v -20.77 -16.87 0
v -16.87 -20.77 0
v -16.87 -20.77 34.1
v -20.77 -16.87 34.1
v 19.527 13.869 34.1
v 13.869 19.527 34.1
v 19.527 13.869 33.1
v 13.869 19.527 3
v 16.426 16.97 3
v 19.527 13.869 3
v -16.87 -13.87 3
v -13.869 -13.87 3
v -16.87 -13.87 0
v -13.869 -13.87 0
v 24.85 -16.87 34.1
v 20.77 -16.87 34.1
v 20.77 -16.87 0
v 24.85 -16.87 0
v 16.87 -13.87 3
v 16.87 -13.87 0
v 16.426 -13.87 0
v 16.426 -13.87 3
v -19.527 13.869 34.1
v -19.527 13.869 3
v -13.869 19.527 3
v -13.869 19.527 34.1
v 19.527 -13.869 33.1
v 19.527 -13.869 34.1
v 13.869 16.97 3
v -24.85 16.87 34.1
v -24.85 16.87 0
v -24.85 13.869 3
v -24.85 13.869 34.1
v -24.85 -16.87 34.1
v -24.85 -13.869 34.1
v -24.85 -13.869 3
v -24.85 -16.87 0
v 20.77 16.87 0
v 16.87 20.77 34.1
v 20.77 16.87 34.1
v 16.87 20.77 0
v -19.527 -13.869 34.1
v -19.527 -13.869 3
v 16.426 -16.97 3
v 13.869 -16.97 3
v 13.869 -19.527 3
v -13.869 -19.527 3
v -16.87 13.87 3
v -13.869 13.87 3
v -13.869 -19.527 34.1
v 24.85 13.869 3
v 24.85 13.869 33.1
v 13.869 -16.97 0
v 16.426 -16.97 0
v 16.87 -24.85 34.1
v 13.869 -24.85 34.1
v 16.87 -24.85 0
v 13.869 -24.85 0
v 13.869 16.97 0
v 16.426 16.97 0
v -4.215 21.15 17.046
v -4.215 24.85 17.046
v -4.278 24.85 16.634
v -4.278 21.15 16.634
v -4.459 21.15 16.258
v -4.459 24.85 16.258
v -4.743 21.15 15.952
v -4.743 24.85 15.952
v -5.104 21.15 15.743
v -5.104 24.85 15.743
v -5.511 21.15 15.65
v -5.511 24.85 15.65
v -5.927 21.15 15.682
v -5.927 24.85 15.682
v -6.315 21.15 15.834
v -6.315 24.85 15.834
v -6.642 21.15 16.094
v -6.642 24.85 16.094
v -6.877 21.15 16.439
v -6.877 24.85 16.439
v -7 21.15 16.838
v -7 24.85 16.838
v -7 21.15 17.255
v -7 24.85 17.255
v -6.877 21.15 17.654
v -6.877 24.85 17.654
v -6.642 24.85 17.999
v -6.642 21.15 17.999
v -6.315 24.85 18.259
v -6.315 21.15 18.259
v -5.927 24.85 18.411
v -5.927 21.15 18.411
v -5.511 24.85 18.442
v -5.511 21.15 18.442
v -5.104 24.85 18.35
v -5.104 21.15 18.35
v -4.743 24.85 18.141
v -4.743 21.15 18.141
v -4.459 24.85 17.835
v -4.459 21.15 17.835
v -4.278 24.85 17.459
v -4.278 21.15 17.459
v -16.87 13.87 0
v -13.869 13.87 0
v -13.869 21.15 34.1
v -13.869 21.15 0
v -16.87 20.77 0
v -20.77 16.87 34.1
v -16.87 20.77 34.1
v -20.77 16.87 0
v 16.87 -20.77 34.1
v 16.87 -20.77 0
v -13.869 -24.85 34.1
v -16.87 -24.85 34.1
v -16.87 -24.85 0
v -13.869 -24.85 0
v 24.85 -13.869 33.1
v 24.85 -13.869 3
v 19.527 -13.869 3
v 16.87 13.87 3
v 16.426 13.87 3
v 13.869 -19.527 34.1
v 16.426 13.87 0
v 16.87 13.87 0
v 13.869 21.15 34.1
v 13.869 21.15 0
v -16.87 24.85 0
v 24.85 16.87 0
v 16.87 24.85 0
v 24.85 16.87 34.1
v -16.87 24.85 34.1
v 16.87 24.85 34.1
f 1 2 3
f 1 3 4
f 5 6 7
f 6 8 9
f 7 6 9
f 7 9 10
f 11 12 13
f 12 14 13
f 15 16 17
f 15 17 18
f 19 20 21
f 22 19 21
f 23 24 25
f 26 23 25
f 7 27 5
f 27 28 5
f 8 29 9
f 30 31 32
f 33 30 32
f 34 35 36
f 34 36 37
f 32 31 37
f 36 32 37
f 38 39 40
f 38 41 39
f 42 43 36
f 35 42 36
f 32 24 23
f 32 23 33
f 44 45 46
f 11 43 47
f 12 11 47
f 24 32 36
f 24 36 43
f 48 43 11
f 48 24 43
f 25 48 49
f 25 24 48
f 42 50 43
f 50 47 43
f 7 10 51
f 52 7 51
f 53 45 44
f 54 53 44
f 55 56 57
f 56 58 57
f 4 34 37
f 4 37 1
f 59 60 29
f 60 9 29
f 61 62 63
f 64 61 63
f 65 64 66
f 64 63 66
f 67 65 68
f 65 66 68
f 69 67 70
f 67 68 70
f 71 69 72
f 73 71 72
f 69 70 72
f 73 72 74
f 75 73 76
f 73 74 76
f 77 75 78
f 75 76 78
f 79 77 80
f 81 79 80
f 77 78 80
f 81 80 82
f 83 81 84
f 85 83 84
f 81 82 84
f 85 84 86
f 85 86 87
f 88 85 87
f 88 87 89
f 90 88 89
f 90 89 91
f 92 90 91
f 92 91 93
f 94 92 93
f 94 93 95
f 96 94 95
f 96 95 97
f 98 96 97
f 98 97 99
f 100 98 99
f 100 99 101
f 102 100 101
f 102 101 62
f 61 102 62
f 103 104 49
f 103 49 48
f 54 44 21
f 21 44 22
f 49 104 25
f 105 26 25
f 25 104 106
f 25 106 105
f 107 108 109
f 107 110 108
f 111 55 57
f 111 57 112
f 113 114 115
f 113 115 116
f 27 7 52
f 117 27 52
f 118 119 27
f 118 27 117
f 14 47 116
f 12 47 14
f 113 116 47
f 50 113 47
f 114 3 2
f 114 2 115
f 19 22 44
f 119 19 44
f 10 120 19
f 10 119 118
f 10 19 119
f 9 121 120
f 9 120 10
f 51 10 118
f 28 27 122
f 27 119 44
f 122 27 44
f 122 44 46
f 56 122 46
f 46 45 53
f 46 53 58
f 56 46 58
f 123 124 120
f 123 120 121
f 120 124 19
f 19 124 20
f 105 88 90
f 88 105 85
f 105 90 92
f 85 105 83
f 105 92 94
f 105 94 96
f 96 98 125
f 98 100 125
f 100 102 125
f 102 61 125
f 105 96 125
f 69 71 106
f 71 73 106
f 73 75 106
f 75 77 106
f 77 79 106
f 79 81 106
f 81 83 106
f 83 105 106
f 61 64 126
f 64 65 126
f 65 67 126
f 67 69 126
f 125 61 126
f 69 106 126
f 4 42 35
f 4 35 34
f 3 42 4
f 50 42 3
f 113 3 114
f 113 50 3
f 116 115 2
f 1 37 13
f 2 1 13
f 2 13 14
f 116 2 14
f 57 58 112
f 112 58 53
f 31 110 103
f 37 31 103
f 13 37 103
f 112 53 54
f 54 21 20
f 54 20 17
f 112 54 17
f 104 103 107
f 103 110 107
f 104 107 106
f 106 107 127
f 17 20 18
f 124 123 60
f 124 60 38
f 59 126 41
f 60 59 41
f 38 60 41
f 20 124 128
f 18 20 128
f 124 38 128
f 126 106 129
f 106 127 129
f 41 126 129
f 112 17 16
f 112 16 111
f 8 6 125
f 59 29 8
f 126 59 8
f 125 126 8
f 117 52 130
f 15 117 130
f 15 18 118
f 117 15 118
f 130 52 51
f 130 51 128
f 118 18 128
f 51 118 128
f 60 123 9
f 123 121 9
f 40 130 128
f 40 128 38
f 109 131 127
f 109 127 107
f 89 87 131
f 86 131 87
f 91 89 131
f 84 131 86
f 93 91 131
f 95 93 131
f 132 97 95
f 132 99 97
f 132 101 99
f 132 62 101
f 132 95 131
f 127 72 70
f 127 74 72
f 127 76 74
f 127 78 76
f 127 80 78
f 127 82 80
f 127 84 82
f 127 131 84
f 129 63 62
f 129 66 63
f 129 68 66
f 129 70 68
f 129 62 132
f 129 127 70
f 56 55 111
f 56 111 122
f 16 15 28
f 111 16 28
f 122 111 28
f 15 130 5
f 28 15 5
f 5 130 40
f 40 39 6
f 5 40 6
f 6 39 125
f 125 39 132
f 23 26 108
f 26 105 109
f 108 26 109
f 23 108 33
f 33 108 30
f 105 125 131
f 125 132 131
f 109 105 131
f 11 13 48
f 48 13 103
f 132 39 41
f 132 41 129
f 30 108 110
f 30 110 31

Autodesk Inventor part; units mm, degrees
ref_plane "Work Plane1" through (0, 0, 0) normal (0, 0, 1) x (1, 0, 0)
sketch "Sketch1" plane through (0, 0, 0) normal (0, 0, 1) x (1, 0, 0)
  arc A0 (12.5934, -5.8404) -> (12.8401, -5.9947) centre (12.8241, -5.7459) ccw construction
  line L0 (12.8401, -5.9947) -> (16.4715, -5.9947) construction
  line L1 (16.4715, -5.9947) -> (16.97, -5.4961) construction
  line L2 (16.97, -5.4961) -> (16.97, 1.583) construction
  arc A1 (16.97, 2.3806) -> (16.97, 1.583) centre (17.2691, 1.9818) ccw construction
  line L3 (16.97, 2.3806) -> (16.97, 5.4715) construction
  line L4 (16.97, 5.4715) -> (16.4715, 5.97) construction
  line L5 (16.4715, 5.97) -> (12.8401, 5.97) construction
  arc A2 (12.8401, 5.97) -> (12.6094, 5.8152) centre (12.8401, 5.7207) ccw construction
  arc A3 (12.0954, 5.2394) -> (12.6094, 5.8152) centre (11.5075, 6.2814) ccw construction
  arc A4 (12.0954, 5.2394) -> (11.974, 5.0466) centre (12.2223, 5.0248) ccw construction
  line L6 (11.974, 5.0466) -> (11.9439, 4.702) construction
  arc A5 (11.6955, 4.4744) -> (11.9439, 4.702) centre (11.6955, 4.7237) ccw construction
  line L7 (11.6955, 4.4744) -> (11.2445, 4.4744) construction
  arc A6 (10.9961, 4.702) -> (11.2445, 4.4744) centre (11.2445, 4.7237) ccw construction
  line L8 (10.9961, 4.702) -> (10.9642, 5.0674) construction
  arc A7 (10.9642, 5.0674) -> (10.8487, 5.2566) centre (10.7158, 5.0457) ccw construction
  arc A8 (10.3792, 5.8152) -> (10.8487, 5.2566) centre (11.4862, 6.2691) ccw construction
  arc A9 (10.3792, 5.8152) -> (10.1485, 5.97) centre (10.1485, 5.7206) ccw construction
  line L9 (10.1485, 5.97) -> (9.4685, 5.97) construction
  line L10 (9.4685, 5.97) -> (8.97, 5.4715) construction
  line L11 (8.97, 5.4715) -> (8.97, -5.4961) construction
  line L12 (8.97, -5.4961) -> (9.4685, -5.9947) construction
  line L13 (9.4685, -5.9947) -> (10.1412, -5.9947) construction
  arc A10 (10.1412, -5.9947) -> (10.3791, -5.84) centre (10.1485, -5.7455) ccw construction
  arc A11 (10.8487, -5.2813) -> (10.3791, -5.84) centre (11.4862, -6.2938) ccw construction
  arc A12 (10.8487, -5.2813) -> (10.9642, -5.0921) centre (10.7158, -5.0704) ccw construction
  line L14 (10.9642, -5.0921) -> (10.9961, -4.7266) construction
  arc A13 (11.2445, -4.4991) -> (10.9961, -4.7266) centre (11.2445, -4.7483) ccw construction
  line L15 (11.2445, -4.4991) -> (11.6955, -4.4991) construction
  arc A14 (11.9439, -4.7266) -> (11.6955, -4.4991) centre (11.6955, -4.7483) ccw construction
  line L16 (11.9439, -4.7266) -> (11.974, -5.0712) construction
  arc A15 (11.974, -5.0712) -> (12.0954, -5.264) centre (12.2223, -5.0495) ccw construction
  arc A16 (12.5934, -5.8404) -> (12.0954, -5.264) centre (11.4862, -6.2938) ccw construction
  arc A17 (24.85, 22.85) -> (22.85, 24.85) centre (22.85, 22.85) ccw construction
  line L17 (22.85, 24.85) -> (-16.97, 24.85) construction
  line L18 (-16.97, 24.85) -> (-16.97, 21.15) construction
  line L19 (-16.97, 21.15) -> (16.97, 21.15) construction
  line L20 (16.97, 16.97) -> (16.97, 21.15) construction
  line L21 (21.15, 16.97) -> (16.97, 16.97) construction
  line L22 (21.15, 16.97) -> (21.15, -16.97) construction
  line L23 (21.15, -16.97) -> (24.85, -16.97) construction
  line L24 (24.85, -16.97) -> (24.85, 22.85) construction
  line L25 (23.75, 23.25) -> (23.75, 18.15) construction
  arc A18 (23.25, 17.65) -> (23.75, 18.15) centre (23.25, 18.15) ccw construction
  line L26 (23.25, 17.65) -> (20.8937, 17.65) construction
  arc A19 (20.5239, 17.8134) -> (20.8937, 17.65) centre (20.8937, 18.15) ccw construction
  line L27 (20.5239, 17.8134) -> (17.7803, 20.8273) construction
  arc A20 (17.65, 21.1639) -> (17.7803, 20.8273) centre (18.15, 21.1639) ccw construction
  line L28 (17.65, 21.1639) -> (17.65, 23.25) construction
  arc A21 (18.15, 23.75) -> (17.65, 23.25) centre (18.15, 23.25) ccw construction
  line L29 (18.15, 23.75) -> (23.25, 23.75) construction
  arc A22 (23.75, 23.25) -> (23.25, 23.75) centre (23.25, 23.25) ccw construction
  arc A23 (-24.85, -22.85) -> (-22.85, -24.85) centre (-22.85, -22.85) ccw construction
  line L30 (-22.85, -24.85) -> (16.97, -24.85) construction
  line L31 (16.97, -24.85) -> (16.97, -21.15) construction
  line L32 (16.97, -21.15) -> (-16.97, -21.15) construction
  line L33 (-16.97, -16.97) -> (-16.97, -21.15) construction
  line L34 (-21.15, -16.97) -> (-16.97, -16.97) construction
  line L35 (-21.15, -16.97) -> (-21.15, 16.97) construction
  line L36 (-21.15, 16.97) -> (-24.85, 16.97) construction
  line L37 (-24.85, 16.97) -> (-24.85, -22.85) construction
  line L38 (-20.8273, -17.7803) -> (-17.8134, -20.5239) construction
  arc A24 (-17.65, -20.8937) -> (-17.8134, -20.5239) centre (-18.15, -20.8937) ccw construction
  line L39 (-17.65, -20.8937) -> (-17.65, -23.25) construction
  arc A25 (-18.15, -23.75) -> (-17.65, -23.25) centre (-18.15, -23.25) ccw construction
  line L40 (-18.15, -23.75) -> (-23.25, -23.75) construction
  arc A26 (-23.75, -23.25) -> (-23.25, -23.75) centre (-23.25, -23.25) ccw construction
  line L41 (-23.75, -23.25) -> (-23.75, -18.15) construction
  arc A27 (-23.25, -17.65) -> (-23.75, -18.15) centre (-23.25, -18.15) ccw construction
  line L42 (-23.25, -17.65) -> (-21.1639, -17.65) construction
  arc A28 (-20.8273, -17.7803) -> (-21.1639, -17.65) centre (-21.1639, -18.15) ccw construction
  arc A29 (-22.85, 24.85) -> (-24.85, 22.85) centre (-22.85, 22.85) ccw construction
  line L43 (-22.85, 24.85) -> (16.97, 24.85) construction
  line L44 (16.97, 24.85) -> (16.97, 21.15) construction
  line L45 (16.97, 21.15) -> (-16.97, 21.15) construction
  line L46 (-16.97, 16.97) -> (-16.97, 21.15) construction
  line L47 (-21.15, 16.97) -> (-16.97, 16.97) construction
  line L48 (-21.15, 16.97) -> (-21.15, -16.97) construction
  line L49 (-21.15, -16.97) -> (-24.85, -16.97) construction
  line L50 (-24.85, -16.97) -> (-24.85, 22.85) construction
  line L51 (-20.8273, 17.7803) -> (-17.8134, 20.5239) construction
  arc A30 (-17.8134, 20.5239) -> (-17.65, 20.8937) centre (-18.15, 20.8937) ccw construction
  line L52 (-17.65, 20.8937) -> (-17.65, 23.25) construction
  arc A31 (-17.65, 23.25) -> (-18.15, 23.75) centre (-18.15, 23.25) ccw construction
  line L53 (-18.15, 23.75) -> (-23.25, 23.75) construction
  arc A32 (-23.25, 23.75) -> (-23.75, 23.25) centre (-23.25, 23.25) ccw construction
  line L54 (-23.75, 23.25) -> (-23.75, 18.15) construction
  arc A33 (-23.75, 18.15) -> (-23.25, 17.65) centre (-23.25, 18.15) ccw construction
  line L55 (-23.25, 17.65) -> (-21.1639, 17.65) construction
  arc A34 (-21.1639, 17.65) -> (-20.8273, 17.7803) centre (-21.1639, 18.15) ccw construction
  arc A35 (22.85, -24.85) -> (24.85, -22.85) centre (22.85, -22.85) ccw construction
  line L56 (22.85, -24.85) -> (-16.97, -24.85) construction
  line L57 (-16.97, -24.85) -> (-16.97, -21.15) construction
  line L58 (-16.97, -21.15) -> (16.97, -21.15) construction
  line L59 (16.97, -16.97) -> (16.97, -21.15) construction
  line L60 (21.15, -16.97) -> (16.97, -16.97) construction
  line L61 (21.15, -16.97) -> (21.15, 16.97) construction
  line L62 (21.15, 16.97) -> (24.85, 16.97) construction
  line L63 (24.85, 16.97) -> (24.85, -22.85) construction
  line L64 (23.75, -23.25) -> (23.75, -18.15) construction
  arc A36 (23.75, -18.15) -> (23.25, -17.65) centre (23.25, -18.15) ccw construction
  line L65 (23.25, -17.65) -> (20.8937, -17.65) construction
  arc A37 (20.8937, -17.65) -> (20.5239, -17.8134) centre (20.8937, -18.15) ccw construction
  line L66 (20.5239, -17.8134) -> (17.7803, -20.8273) construction
  arc A38 (17.7803, -20.8273) -> (17.65, -21.1639) centre (18.15, -21.1639) ccw construction
  line L67 (17.65, -21.1639) -> (17.65, -23.25) construction
  arc A39 (17.65, -23.25) -> (18.15, -23.75) centre (18.15, -23.25) ccw construction
  line L68 (18.15, -23.75) -> (23.25, -23.75) construction
  arc A40 (23.25, -23.75) -> (23.75, -23.25) centre (23.25, -23.25) ccw construction
  circle A41 centre (0.47, -10.47) radius 1.1 construction
  circle A42 centre (0.47, 12.53) radius 1.025 construction
  line L69 (24.85, 16.87) -> (16.87, 16.87)
  line L70 (16.87, 16.87) -> (16.87, -16.87)
  line L71 (16.87, -16.87) -> (24.85, -16.87)
  line L72 (24.85, -16.87) -> (24.85, 16.87)
  line L73 (-16.87, 24.85) -> (16.87, 24.85)
  line L74 (16.87, 24.85) -> (16.87, 13.87)
  line L75 (16.87, 13.87) -> (-16.87, 13.87)
  line L76 (-16.87, 13.87) -> (-16.87, 24.85)
  line L77 (-16.87, 16.87) -> (-24.85, 16.87)
  line L78 (-24.85, 16.87) -> (-24.85, -16.87)
  line L79 (-24.85, -16.87) -> (-16.87, -16.87)
  line L80 (-16.87, -16.87) -> (-16.87, 16.87)
  line L81 (-16.87, -24.85) -> (16.87, -24.85)
  line L82 (16.87, -24.85) -> (16.87, -13.87)
  line L83 (16.87, -13.87) -> (-16.87, -13.87)
  line L84 (-16.87, -13.87) -> (-16.87, -24.85)
  point P0 (0, 0)
extrude "Extrusion1" add sketch "Sketch1" along normal blind 3 contours L72 L71 L70 L69 | L70 L75 L76 L73 L74 | L82 L81 L84 L80 L83 L70 | L80 L79 L78 L77 L76
chamfer "Chamfer1" distance 3.9 angle 45 4 edges at (16.87, -16.87, 1.5) (-16.87, -16.87, 1.5) (-16.87, 16.87, 1.5) (16.87, 16.87, 1.5)
sketch "Sketch2" plane through (0, 0, 3) normal (0, 0, 1) x (1, 0, 0)
  line L0 (-16.87, -13.87) -> (-16.87, 13.87) projected
  line L1 (-16.87, 13.87) -> (16.87, 13.87) projected
  line L2 (16.87, 13.87) -> (16.87, -13.87) projected
  line L3 (16.87, -13.87) -> (-16.87, -13.87) projected
  line L4 (-16.87, -20.77) -> (-16.87, -24.85) projected
  line L5 (-16.87, -24.85) -> (16.87, -24.85) projected
  line L6 (16.87, -24.85) -> (16.87, -20.77) projected
  line L7 (20.77, -16.87) -> (16.87, -20.77) projected
  line L8 (20.77, -16.87) -> (24.85, -16.87) projected
  line L9 (24.85, -16.87) -> (24.85, 16.87) projected
  line L10 (24.85, 16.87) -> (20.77, 16.87) projected
  line L11 (16.87, 20.77) -> (20.77, 16.87) projected
  line L12 (16.87, 20.77) -> (16.87, 24.85) projected
  line L13 (16.87, 24.85) -> (-16.87, 24.85) projected
  line L14 (-16.87, 24.85) -> (-16.87, 20.77) projected
  line L15 (-20.77, 16.87) -> (-16.87, 20.77) projected
  line L16 (-20.77, 16.87) -> (-24.85, 16.87) projected
  line L17 (-24.85, 16.87) -> (-24.85, -16.87) projected
  line L18 (-24.85, -16.87) -> (-20.77, -16.87) projected
  line L19 (-16.87, -20.77) -> (-20.77, -16.87) projected
  line L20 (13.8689, -19.5269) -> (13.8689, -21.8489)
  line L21 (-13.8689, -21.8489) -> (-13.8689, -19.5269)
  line L22 (-13.8689, -19.5269) -> (-19.5269, -13.8689)
  line L23 (-19.5269, -13.8689) -> (-21.8489, -13.8689)
  line L24 (-21.8489, 13.8689) -> (-19.5269, 13.8689)
  line L25 (-19.5269, 13.8689) -> (-13.8689, 19.5269)
  line L26 (-13.8689, 19.5269) -> (-13.8689, 21.8489)
  line L27 (13.8689, 21.8489) -> (13.8689, 19.5269)
  line L28 (13.8689, 19.5269) -> (19.5269, 13.8689)
  line L29 (19.5269, 13.8689) -> (21.8489, 13.8689)
  line L30 (21.8489, -13.8689) -> (19.5269, -13.8689)
  line L31 (19.5269, -13.8689) -> (13.8689, -19.5269)
  line L32 (13.8689, -21.8489) -> (13.8689, -24.85)
  line L33 (16.87, -24.85) -> (-16.87, -24.85) projected
  line L34 (21.8489, -13.8689) -> (24.85, -13.8689)
  line L35 (24.85, -16.87) -> (24.85, 16.87) projected
  line L36 (21.8489, 13.8689) -> (24.85, 13.8689)
  line L37 (13.8689, 21.8489) -> (13.8689, 24.85)
  line L38 (-13.8689, 21.8489) -> (-13.8689, 24.85)
  line L39 (-21.8489, 13.8689) -> (-24.85, 13.8689)
  line L40 (-21.8489, -13.8689) -> (-24.85, -13.8689)
  line L41 (-13.8689, -21.8489) -> (-13.8689, -24.85)
  line L42 (13.8689, -21.8489) -> (11.5469, -21.8489)
  line L43 (-11.5469, -21.8489) -> (-13.8689, -21.8489)
  line L44 (21.8489, 13.8689) -> (21.8489, 11.5469)
  line L45 (21.8489, -11.5469) -> (21.8489, -13.8689)
  line L46 (-21.8489, -13.8689) -> (-21.8489, -11.5469)
  line L47 (-21.8489, 11.5469) -> (-21.8489, 13.8689)
  line L48 (-13.8689, 21.8489) -> (-11.5469, 21.8489)
  line L49 (11.5469, 21.8489) -> (13.8689, 21.8489)
  point P0 (0, 0)
  dimension "d13" = 3.0011
ref_plane "Work Plane2" through (-16.97, -24.85, 34.1) normal (0, 0, -1) x (0, 1, 0)
extrude "Extrusion2" add sketch "Sketch2" along normal up to surface (31.1 mm away) contours L32 L20 L31 L30 L34 L9 L8 L7 L6 L5
pattern_circular "Circular Pattern1" count 4 over 360 about axis through (0, 0, 17.13) along (0, 0, -1) of "Extrusion2"
sketch "Sketch3" plane through (-24.85, -13.8689, 34.1) normal (0, 0, 1) x (1, 0, 0)
  circle A0 centre (13.82, 14.8989) radius 1.5 projected
  line L0 (10.9811, -5.658) -> (5.3231, 0) projected
  line L1 (5.3231, 0) -> (0, 0) projected
  line L2 (0, 0) -> (0, -3.0011) projected
  line L3 (0, -3.0011) -> (4.08, -3.0011) projected
  line L4 (4.08, -3.0011) -> (7.98, -6.9011) projected
  line L5 (7.98, -6.9011) -> (7.98, -10.9811) projected
  line L6 (7.98, -10.9811) -> (10.9811, -10.9811) projected
  line L7 (10.9811, -10.9811) -> (10.9811, -5.658) projected
  line L8 (5.3231, 27.7378) -> (10.9811, 33.3958) projected
  line L9 (10.9811, 33.3958) -> (10.9811, 38.7189) projected
  line L10 (10.9811, 38.7189) -> (7.98, 38.7189) projected
  line L11 (7.98, 38.7189) -> (7.98, 34.6389) projected
  line L12 (7.98, 34.6389) -> (4.08, 30.7389) projected
  line L13 (4.08, 30.7389) -> (0, 30.7389) projected
  line L14 (0, 30.7389) -> (0, 27.7378) projected
  line L15 (0, 27.7378) -> (5.3231, 27.7378) projected
  line L16 (10.9811, -10.9811) -> (16.9811, -10.9811)
  line L17 (16.9811, 38.7189) -> (10.9811, 38.7189)
  line L18 (0, 0) -> (0, 27.7378)
  line L19 (0, 0) -> (5.3231, 0)
  line L20 (5.3231, 0) -> (5.3231, 27.7378)
  line L21 (5.3231, 27.7378) -> (0, 27.7378)
  line L22 (0, 27.7378) -> (0, 0)
  line L23 (5.3231, 0) -> (0, 0) projected
  line L24 (5.3231, 0) -> (10.9811, -5.658)
  line L25 (10.9811, 33.3958) -> (5.3231, 27.7378)
  line L26 (38.7189, 38.7189) -> (38.7189, 33.3958) projected
  line L27 (38.7189, -5.658) -> (38.7189, -10.9811) projected
  line L28 (10.9811, -10.9811) -> (38.7189, -10.9811)
  line L29 (38.7189, -10.9811) -> (38.7189, -5.658)
  line L30 (38.7189, -5.658) -> (10.9811, -5.658)
  line L31 (10.9811, -5.658) -> (10.9811, -10.9811)
  line L32 (10.9811, 38.7189) -> (10.9811, 33.3958) projected
  line L33 (10.9811, 38.7189) -> (38.7189, 38.7189)
  line L34 (38.7189, 38.7189) -> (38.7189, 33.3958)
  line L35 (38.7189, 33.3958) -> (10.9811, 33.3958)
  line L36 (10.9811, 33.3958) -> (10.9811, 38.7189)
  line L37 (16.9811, -10.9811) -> (16.9811, -5.658)
  line L38 (16.9811, 33.3958) -> (16.9811, 38.7189)
  line L39 (10.9811, 38.7189) -> (10.9811, 33.3958)
  line L40 (10.9811, -5.658) -> (10.9811, -10.9811)
  line L41 (10.9811, -5.658) -> (10.9811, 0)
  line L42 (10.9811, 27.7378) -> (10.9811, 33.3958)
  line L43 (49.7, 0) -> (44.3769, 0) projected
  line L44 (44.3769, 27.7378) -> (49.7, 27.7378) projected
  line L45 (44.3769, 27.7378) -> (49.7, 27.7378)
  line L46 (49.7, 27.7378) -> (49.7, 0)
  line L47 (49.7, 0) -> (44.3769, 0)
  line L48 (44.3769, 0) -> (44.3769, 27.7378)
  point P0 (24.85, 13.8689)
  dimension "d19" = 6
extrude "Extrusion3" add sketch "Sketch3" against normal blind 1 contours L7 L6 L5 L4 L3 L2 L1 L0 | L15 L14 L13 L12 L11 L10 L9 L8 | L43 L48 L44 L46
sketch "Sketch4" plane through (24.85, -16.87, 0) normal (1, 0, 0) x (0, 0, -1)
  line L0 (37.9, 11.3739) -> (37.9, 18.453) construction
  line L1 (23.6194, 18.453) -> (37.9, 18.453) construction
  arc A0 (22.1806, 18.453) -> (23.6194, 18.453) centre (22.9, 16.8577) ccw construction
  line L2 (-1.3806, 18.453) -> (22.1806, 18.453) construction
  arc A1 (-2.8194, 18.453) -> (-1.3806, 18.453) centre (-2.1, 16.8577) ccw construction
  line L3 (-31.3806, 18.453) -> (-2.8194, 18.453) construction
  arc A2 (-32.8194, 18.453) -> (-31.3806, 18.453) centre (-32.1, 16.8577) ccw construction
  line L4 (-42.1, 18.453) -> (-32.8194, 18.453) construction
  line L5 (-42.1, 11.3739) -> (-42.1, 18.453) construction
  line L6 (-42.1, 11.3739) -> (37.9, 11.3739) construction
  line L7 (37.9, 19.2506) -> (37.9, 22.3415) construction
  line L8 (-42.1, 22.3415) -> (37.9, 22.3415) construction
  line L9 (-42.1, 19.2506) -> (-42.1, 22.3415) construction
  line L10 (-42.1, 19.2506) -> (37.9, 19.2506) construction
  line L11 (-3, 3.0011) -> (-3, 30.7389) construction
  line L12 (-34.1, 33.84) -> (-34.1, -5.98) construction
  line L13 (-3, 11.3739) -> (-34.1, 11.3739)
  line L14 (-34.1, 11.3739) -> (-34.1, 22.3415)
  line L15 (-34.1, 22.3415) -> (-3, 22.3415)
  line L16 (-3, 22.3415) -> (-3, 11.3739)
  line L17 (-34.1, 11.3739) -> (-32.1, 11.3739)
  line L18 (-32.1, 11.3739) -> (-32.1, 3.0011)
  line L19 (-32.1, 3.0011) -> (-34.1, 3.0011)
  line L20 (-34.1, 3.0011) -> (-34.1, 11.3739)
  line L21 (-34.1, 22.3415) -> (-32.1, 22.3415)
  line L22 (-32.1, 22.3415) -> (-32.1, 30.7389)
  line L23 (-32.1, 30.7389) -> (-34.1, 30.7389)
  line L24 (-34.1, 30.7389) -> (-34.1, 22.3415)
  point P0 (0, 16.87)
  dimension "d24" = 2
ref_plane "Work Plane3" through (16.97, -5.4961, -37.9) normal (1, 0, 0) x (0, 1, 0)
sketch "Sketch7" plane through (0, 0, 0) normal (0, 0, -1) x (-1, 0, 0)
  arc A0 (18.93, 12.43) -> (22.43, 8.93) centre (22.43, 12.43) ccw construction
  line L0 (18.93, 12.43) -> (18.93, 14.53) construction
  line L1 (3.13, 14.53) -> (18.93, 14.53) construction
  line L2 (3.13, 14.53) -> (3.13, 12.43) construction
  arc A1 (-0.37, 8.93) -> (3.13, 12.43) centre (-0.37, 12.43) ccw construction
  line L3 (-0.37, 8.93) -> (-2.47, 8.93) construction
  line L4 (-2.47, -6.87) -> (-2.47, 8.93) construction
  line L5 (-2.47, -6.87) -> (-0.37, -6.87) construction
  arc A2 (3.13, -10.37) -> (-0.37, -6.87) centre (-0.37, -10.37) ccw construction
  line L6 (3.13, -10.37) -> (3.13, -12.47) construction
  line L7 (18.93, -12.47) -> (3.13, -12.47) construction
  line L8 (18.93, -12.47) -> (18.93, -10.37) construction
  arc A3 (22.43, -6.87) -> (18.93, -10.37) centre (22.43, -10.37) ccw construction
  line L9 (22.43, -6.87) -> (24.53, -6.87) construction
  line L10 (24.53, 8.93) -> (24.53, -6.87) construction
  line L11 (24.53, 8.93) -> (22.43, 8.93) construction
  circle A4 centre (11.03, 1.03) radius 2.5 construction
  arc A5 (-1.5344, 11.2045) -> (0.934, 13.4886) centre (-0.47, 12.53) ccw construction
  circle A6 centre (-0.47, -10.47) radius 1.1 construction
  arc A7 (0.5944, 13.8555) -> (-1.874, 11.5714) centre (-0.47, 12.53) ccw construction
  line L12 (-19.5269, -13.8689) -> (-24.85, -13.8689) construction
  line L13 (-16.87, 13.87) -> (-16.87, -13.87) construction
  line L14 (-16.87, -13.87) -> (16.87, -13.87) construction
  line L15 (16.87, -13.87) -> (16.87, 13.87) construction
  line L16 (16.87, 13.87) -> (-16.87, 13.87) construction
  line L17 (-19.5269, 13.8689) -> (-13.8689, 19.5269) construction
  line L18 (-13.8689, 19.5269) -> (-13.8689, 24.85) construction
  line L19 (-13.8689, 24.85) -> (13.8689, 24.85) construction
  line L20 (13.8689, 24.85) -> (13.8689, 19.5269) construction
  line L21 (13.8689, 19.5269) -> (19.5269, 13.8689) construction
  line L22 (19.5269, 13.8689) -> (24.85, 13.8689) construction
  line L23 (24.85, 13.8689) -> (24.85, -13.8689) construction
  line L24 (24.85, -13.8689) -> (19.5269, -13.8689) construction
  line L25 (19.5269, -13.8689) -> (13.8689, -19.5269) construction
  line L26 (13.8689, -19.5269) -> (13.8689, -24.85) construction
  line L27 (13.8689, -24.85) -> (-13.8689, -24.85) construction
  line L28 (-13.8689, -24.85) -> (-13.8689, -19.5269) construction
  line L29 (-13.8689, -19.5269) -> (-19.5269, -13.8689) construction
  line L30 (16.87, 13.87) -> (-16.87, 13.87) construction
  line L31 (16.87, 13.87) -> (-19.5258, 13.87) projected
  line L32 (-2.13, 13.87) -> (16.87, 13.87)
  line L33 (16.87, 13.87) -> (16.87, -16.45)
  line L34 (16.87, -16.45) -> (-2.13, -16.45)
  line L35 (-2.13, -16.45) -> (-2.13, 13.87)
  line L36 (16.97, 16.97) -> (-16.97, 16.97)
  line L37 (16.87, 13.87) -> (-2.13, 13.87)
  line L38 (-2.13, 13.87) -> (-2.13, 16.45)
  line L39 (-2.13, 16.45) -> (16.87, 16.45)
  line L40 (16.87, 16.45) -> (16.87, 13.87)
  line L41 (-16.97, -16.97) -> (16.97, -16.97) construction
  line L42 (-24.85, -13.8689) -> (-24.85, 13.8689) projected
  line L43 (-24.85, 13.8689) -> (-19.5269, 13.8689) projected
  point P0 (0, 0)
  dimension "d35" = 19
  dimension "d36" = 0
  dimension "d74" = 16.45
  dimension "d75" = 16.45
ref_plane "Work Plane4" through (-25.03, -12.97, -12) normal (0, 0, 1) x (1, 0, 0)
sketch "Sketch14" plane through (-16.87, 24.85, 0) normal (0, 1, 0) x (1, 0, 0)
  line L0 (3.0011, -3) -> (3.0011, -34.1) projected
  line L1 (30.7389, -3) -> (3.0011, -3) projected
  line L2 (30.7389, -3) -> (30.7389, -34.1) projected
  line L3 (33.74, -34.1) -> (30.7389, -34.1) projected
  line L4 (33.74, 0) -> (33.74, -34.1) projected
  line L5 (33.74, 0) -> (0, 0) projected
  line L6 (0, 0) -> (0, -34.1) projected
  line L7 (3.0011, -34.1) -> (0, -34.1) projected
  line L8 (3.0011, -3) -> (3.0011, -34.1) projected
  line L9 (30.7389, -34.1) -> (36.3969, -34.1) projected
  line L10 (3.0011, -3) -> (30.7389, -3)
  line L11 (30.7389, -3) -> (30.7389, -34.1)
  line L12 (30.7389, -34.1) -> (3.0011, -34.1)
  line L13 (3.0011, -34.1) -> (3.0011, -3)
  circle A0 centre (11.8112, -17.0464) radius 1.4 construction
  circle A1 centre (11.2546, -17.0464) radius 1.4
  point P0 (16.87, 0)
  dimension "d89" = 2.8
extrude "Extrusion12" add sketch "Sketch14" against normal up to surface (3.7 mm away) contours L1 L2 L12 L0
sketch "Sketch15" plane through (0, 0, 3) normal (0, 0, 1) x (1, 0, 0)
  line L0 (19.5269, 13.8689) -> (13.8689, 19.5269) projected
  line L1 (2.2647, -16.97) -> (16.4258, -16.97)
  line L2 (16.4258, -16.97) -> (16.4258, 16.97)
  line L3 (16.4258, 16.97) -> (2.2647, 16.97)
  line L4 (2.2647, 16.97) -> (2.2647, -16.97)
  line L5 (2.2647, -16.97) -> (16.4258, 16.97) construction
  line L6 (16.4258, -16.97) -> (2.2647, 16.97) construction
  line L7 (13.8689, -24.85) -> (13.8689, -19.5269) projected
  line L8 (13.8689, -19.5269) -> (19.5269, -13.8689) projected
  line L9 (19.5269, -13.8689) -> (24.85, -13.8689) projected
  line L10 (24.85, -13.8689) -> (24.85, 13.8689) projected
  line L11 (16.87, 13.87) -> (16.87, -13.87) projected
  line L12 (16.87, -13.87) -> (-16.87, -13.87) projected
  line L13 (-16.87, -13.87) -> (-16.87, 13.87) projected
  line L14 (-16.87, 13.87) -> (16.87, 13.87) projected
  line L15 (24.85, 13.8689) -> (19.5269, 13.8689) projected
  line L16 (19.5269, 13.8689) -> (13.8689, 19.5269) projected
  line L17 (13.8689, 19.5269) -> (13.8689, 21.15) projected
  line L18 (-13.8689, 21.15) -> (-13.8689, 19.5269) projected
  line L19 (-13.8689, 19.5269) -> (-19.5269, 13.8689) projected
  line L20 (-19.5269, 13.8689) -> (-24.85, 13.8689) projected
  line L21 (-24.85, 13.8689) -> (-24.85, -13.8689) projected
  line L22 (-24.85, -13.8689) -> (-19.5269, -13.8689) projected
  line L23 (-19.5269, -13.8689) -> (-13.8689, -19.5269) projected
  line L24 (-13.8689, -19.5269) -> (-13.8689, -24.85) projected
  line L25 (13.8689, 19.5269) -> (13.8689, -19.5269)
  line L26 (16.87, 24.85) -> (-16.87, 24.85) projected
  line L27 (-13.8689, -19.5269) -> (-19.5269, -13.8689) projected
  line L28 (-13.8689, -19.5269) -> (-13.8689, 19.5269)
  line L29 (13.8689, 21.15) -> (-13.8689, 21.15) projected
  line L30 (-13.8689, -24.85) -> (13.8689, -24.85) projected
  point P0 (0, 0)
  point P1 (9.3452, 0)
extrude "Extrusion13" cut sketch "Sketch15" against normal through all contours L2 L14 L25 L3 | L25 L3 L4 L14 L28 L18 L29 L17 | L2 L12 L25 L14 | L25 L14 L4 L3 | L2 L1 L25 L12 | L25 L12 L4 L14 | L25 L1 L4 L12 | L4 L12 L28 L14 | L25 L7 L30 L24 L28 L12 L4 L1
equation "\"d2\" = d1"
equation "\"d3\" = d1"
equation "\"d4\" = d1"
equation "\"d5\" = d1"
equation "\"d1\" = 0.1"
properties part number "30_Cube_Z_Focus_MGN_manual_base_v3"
